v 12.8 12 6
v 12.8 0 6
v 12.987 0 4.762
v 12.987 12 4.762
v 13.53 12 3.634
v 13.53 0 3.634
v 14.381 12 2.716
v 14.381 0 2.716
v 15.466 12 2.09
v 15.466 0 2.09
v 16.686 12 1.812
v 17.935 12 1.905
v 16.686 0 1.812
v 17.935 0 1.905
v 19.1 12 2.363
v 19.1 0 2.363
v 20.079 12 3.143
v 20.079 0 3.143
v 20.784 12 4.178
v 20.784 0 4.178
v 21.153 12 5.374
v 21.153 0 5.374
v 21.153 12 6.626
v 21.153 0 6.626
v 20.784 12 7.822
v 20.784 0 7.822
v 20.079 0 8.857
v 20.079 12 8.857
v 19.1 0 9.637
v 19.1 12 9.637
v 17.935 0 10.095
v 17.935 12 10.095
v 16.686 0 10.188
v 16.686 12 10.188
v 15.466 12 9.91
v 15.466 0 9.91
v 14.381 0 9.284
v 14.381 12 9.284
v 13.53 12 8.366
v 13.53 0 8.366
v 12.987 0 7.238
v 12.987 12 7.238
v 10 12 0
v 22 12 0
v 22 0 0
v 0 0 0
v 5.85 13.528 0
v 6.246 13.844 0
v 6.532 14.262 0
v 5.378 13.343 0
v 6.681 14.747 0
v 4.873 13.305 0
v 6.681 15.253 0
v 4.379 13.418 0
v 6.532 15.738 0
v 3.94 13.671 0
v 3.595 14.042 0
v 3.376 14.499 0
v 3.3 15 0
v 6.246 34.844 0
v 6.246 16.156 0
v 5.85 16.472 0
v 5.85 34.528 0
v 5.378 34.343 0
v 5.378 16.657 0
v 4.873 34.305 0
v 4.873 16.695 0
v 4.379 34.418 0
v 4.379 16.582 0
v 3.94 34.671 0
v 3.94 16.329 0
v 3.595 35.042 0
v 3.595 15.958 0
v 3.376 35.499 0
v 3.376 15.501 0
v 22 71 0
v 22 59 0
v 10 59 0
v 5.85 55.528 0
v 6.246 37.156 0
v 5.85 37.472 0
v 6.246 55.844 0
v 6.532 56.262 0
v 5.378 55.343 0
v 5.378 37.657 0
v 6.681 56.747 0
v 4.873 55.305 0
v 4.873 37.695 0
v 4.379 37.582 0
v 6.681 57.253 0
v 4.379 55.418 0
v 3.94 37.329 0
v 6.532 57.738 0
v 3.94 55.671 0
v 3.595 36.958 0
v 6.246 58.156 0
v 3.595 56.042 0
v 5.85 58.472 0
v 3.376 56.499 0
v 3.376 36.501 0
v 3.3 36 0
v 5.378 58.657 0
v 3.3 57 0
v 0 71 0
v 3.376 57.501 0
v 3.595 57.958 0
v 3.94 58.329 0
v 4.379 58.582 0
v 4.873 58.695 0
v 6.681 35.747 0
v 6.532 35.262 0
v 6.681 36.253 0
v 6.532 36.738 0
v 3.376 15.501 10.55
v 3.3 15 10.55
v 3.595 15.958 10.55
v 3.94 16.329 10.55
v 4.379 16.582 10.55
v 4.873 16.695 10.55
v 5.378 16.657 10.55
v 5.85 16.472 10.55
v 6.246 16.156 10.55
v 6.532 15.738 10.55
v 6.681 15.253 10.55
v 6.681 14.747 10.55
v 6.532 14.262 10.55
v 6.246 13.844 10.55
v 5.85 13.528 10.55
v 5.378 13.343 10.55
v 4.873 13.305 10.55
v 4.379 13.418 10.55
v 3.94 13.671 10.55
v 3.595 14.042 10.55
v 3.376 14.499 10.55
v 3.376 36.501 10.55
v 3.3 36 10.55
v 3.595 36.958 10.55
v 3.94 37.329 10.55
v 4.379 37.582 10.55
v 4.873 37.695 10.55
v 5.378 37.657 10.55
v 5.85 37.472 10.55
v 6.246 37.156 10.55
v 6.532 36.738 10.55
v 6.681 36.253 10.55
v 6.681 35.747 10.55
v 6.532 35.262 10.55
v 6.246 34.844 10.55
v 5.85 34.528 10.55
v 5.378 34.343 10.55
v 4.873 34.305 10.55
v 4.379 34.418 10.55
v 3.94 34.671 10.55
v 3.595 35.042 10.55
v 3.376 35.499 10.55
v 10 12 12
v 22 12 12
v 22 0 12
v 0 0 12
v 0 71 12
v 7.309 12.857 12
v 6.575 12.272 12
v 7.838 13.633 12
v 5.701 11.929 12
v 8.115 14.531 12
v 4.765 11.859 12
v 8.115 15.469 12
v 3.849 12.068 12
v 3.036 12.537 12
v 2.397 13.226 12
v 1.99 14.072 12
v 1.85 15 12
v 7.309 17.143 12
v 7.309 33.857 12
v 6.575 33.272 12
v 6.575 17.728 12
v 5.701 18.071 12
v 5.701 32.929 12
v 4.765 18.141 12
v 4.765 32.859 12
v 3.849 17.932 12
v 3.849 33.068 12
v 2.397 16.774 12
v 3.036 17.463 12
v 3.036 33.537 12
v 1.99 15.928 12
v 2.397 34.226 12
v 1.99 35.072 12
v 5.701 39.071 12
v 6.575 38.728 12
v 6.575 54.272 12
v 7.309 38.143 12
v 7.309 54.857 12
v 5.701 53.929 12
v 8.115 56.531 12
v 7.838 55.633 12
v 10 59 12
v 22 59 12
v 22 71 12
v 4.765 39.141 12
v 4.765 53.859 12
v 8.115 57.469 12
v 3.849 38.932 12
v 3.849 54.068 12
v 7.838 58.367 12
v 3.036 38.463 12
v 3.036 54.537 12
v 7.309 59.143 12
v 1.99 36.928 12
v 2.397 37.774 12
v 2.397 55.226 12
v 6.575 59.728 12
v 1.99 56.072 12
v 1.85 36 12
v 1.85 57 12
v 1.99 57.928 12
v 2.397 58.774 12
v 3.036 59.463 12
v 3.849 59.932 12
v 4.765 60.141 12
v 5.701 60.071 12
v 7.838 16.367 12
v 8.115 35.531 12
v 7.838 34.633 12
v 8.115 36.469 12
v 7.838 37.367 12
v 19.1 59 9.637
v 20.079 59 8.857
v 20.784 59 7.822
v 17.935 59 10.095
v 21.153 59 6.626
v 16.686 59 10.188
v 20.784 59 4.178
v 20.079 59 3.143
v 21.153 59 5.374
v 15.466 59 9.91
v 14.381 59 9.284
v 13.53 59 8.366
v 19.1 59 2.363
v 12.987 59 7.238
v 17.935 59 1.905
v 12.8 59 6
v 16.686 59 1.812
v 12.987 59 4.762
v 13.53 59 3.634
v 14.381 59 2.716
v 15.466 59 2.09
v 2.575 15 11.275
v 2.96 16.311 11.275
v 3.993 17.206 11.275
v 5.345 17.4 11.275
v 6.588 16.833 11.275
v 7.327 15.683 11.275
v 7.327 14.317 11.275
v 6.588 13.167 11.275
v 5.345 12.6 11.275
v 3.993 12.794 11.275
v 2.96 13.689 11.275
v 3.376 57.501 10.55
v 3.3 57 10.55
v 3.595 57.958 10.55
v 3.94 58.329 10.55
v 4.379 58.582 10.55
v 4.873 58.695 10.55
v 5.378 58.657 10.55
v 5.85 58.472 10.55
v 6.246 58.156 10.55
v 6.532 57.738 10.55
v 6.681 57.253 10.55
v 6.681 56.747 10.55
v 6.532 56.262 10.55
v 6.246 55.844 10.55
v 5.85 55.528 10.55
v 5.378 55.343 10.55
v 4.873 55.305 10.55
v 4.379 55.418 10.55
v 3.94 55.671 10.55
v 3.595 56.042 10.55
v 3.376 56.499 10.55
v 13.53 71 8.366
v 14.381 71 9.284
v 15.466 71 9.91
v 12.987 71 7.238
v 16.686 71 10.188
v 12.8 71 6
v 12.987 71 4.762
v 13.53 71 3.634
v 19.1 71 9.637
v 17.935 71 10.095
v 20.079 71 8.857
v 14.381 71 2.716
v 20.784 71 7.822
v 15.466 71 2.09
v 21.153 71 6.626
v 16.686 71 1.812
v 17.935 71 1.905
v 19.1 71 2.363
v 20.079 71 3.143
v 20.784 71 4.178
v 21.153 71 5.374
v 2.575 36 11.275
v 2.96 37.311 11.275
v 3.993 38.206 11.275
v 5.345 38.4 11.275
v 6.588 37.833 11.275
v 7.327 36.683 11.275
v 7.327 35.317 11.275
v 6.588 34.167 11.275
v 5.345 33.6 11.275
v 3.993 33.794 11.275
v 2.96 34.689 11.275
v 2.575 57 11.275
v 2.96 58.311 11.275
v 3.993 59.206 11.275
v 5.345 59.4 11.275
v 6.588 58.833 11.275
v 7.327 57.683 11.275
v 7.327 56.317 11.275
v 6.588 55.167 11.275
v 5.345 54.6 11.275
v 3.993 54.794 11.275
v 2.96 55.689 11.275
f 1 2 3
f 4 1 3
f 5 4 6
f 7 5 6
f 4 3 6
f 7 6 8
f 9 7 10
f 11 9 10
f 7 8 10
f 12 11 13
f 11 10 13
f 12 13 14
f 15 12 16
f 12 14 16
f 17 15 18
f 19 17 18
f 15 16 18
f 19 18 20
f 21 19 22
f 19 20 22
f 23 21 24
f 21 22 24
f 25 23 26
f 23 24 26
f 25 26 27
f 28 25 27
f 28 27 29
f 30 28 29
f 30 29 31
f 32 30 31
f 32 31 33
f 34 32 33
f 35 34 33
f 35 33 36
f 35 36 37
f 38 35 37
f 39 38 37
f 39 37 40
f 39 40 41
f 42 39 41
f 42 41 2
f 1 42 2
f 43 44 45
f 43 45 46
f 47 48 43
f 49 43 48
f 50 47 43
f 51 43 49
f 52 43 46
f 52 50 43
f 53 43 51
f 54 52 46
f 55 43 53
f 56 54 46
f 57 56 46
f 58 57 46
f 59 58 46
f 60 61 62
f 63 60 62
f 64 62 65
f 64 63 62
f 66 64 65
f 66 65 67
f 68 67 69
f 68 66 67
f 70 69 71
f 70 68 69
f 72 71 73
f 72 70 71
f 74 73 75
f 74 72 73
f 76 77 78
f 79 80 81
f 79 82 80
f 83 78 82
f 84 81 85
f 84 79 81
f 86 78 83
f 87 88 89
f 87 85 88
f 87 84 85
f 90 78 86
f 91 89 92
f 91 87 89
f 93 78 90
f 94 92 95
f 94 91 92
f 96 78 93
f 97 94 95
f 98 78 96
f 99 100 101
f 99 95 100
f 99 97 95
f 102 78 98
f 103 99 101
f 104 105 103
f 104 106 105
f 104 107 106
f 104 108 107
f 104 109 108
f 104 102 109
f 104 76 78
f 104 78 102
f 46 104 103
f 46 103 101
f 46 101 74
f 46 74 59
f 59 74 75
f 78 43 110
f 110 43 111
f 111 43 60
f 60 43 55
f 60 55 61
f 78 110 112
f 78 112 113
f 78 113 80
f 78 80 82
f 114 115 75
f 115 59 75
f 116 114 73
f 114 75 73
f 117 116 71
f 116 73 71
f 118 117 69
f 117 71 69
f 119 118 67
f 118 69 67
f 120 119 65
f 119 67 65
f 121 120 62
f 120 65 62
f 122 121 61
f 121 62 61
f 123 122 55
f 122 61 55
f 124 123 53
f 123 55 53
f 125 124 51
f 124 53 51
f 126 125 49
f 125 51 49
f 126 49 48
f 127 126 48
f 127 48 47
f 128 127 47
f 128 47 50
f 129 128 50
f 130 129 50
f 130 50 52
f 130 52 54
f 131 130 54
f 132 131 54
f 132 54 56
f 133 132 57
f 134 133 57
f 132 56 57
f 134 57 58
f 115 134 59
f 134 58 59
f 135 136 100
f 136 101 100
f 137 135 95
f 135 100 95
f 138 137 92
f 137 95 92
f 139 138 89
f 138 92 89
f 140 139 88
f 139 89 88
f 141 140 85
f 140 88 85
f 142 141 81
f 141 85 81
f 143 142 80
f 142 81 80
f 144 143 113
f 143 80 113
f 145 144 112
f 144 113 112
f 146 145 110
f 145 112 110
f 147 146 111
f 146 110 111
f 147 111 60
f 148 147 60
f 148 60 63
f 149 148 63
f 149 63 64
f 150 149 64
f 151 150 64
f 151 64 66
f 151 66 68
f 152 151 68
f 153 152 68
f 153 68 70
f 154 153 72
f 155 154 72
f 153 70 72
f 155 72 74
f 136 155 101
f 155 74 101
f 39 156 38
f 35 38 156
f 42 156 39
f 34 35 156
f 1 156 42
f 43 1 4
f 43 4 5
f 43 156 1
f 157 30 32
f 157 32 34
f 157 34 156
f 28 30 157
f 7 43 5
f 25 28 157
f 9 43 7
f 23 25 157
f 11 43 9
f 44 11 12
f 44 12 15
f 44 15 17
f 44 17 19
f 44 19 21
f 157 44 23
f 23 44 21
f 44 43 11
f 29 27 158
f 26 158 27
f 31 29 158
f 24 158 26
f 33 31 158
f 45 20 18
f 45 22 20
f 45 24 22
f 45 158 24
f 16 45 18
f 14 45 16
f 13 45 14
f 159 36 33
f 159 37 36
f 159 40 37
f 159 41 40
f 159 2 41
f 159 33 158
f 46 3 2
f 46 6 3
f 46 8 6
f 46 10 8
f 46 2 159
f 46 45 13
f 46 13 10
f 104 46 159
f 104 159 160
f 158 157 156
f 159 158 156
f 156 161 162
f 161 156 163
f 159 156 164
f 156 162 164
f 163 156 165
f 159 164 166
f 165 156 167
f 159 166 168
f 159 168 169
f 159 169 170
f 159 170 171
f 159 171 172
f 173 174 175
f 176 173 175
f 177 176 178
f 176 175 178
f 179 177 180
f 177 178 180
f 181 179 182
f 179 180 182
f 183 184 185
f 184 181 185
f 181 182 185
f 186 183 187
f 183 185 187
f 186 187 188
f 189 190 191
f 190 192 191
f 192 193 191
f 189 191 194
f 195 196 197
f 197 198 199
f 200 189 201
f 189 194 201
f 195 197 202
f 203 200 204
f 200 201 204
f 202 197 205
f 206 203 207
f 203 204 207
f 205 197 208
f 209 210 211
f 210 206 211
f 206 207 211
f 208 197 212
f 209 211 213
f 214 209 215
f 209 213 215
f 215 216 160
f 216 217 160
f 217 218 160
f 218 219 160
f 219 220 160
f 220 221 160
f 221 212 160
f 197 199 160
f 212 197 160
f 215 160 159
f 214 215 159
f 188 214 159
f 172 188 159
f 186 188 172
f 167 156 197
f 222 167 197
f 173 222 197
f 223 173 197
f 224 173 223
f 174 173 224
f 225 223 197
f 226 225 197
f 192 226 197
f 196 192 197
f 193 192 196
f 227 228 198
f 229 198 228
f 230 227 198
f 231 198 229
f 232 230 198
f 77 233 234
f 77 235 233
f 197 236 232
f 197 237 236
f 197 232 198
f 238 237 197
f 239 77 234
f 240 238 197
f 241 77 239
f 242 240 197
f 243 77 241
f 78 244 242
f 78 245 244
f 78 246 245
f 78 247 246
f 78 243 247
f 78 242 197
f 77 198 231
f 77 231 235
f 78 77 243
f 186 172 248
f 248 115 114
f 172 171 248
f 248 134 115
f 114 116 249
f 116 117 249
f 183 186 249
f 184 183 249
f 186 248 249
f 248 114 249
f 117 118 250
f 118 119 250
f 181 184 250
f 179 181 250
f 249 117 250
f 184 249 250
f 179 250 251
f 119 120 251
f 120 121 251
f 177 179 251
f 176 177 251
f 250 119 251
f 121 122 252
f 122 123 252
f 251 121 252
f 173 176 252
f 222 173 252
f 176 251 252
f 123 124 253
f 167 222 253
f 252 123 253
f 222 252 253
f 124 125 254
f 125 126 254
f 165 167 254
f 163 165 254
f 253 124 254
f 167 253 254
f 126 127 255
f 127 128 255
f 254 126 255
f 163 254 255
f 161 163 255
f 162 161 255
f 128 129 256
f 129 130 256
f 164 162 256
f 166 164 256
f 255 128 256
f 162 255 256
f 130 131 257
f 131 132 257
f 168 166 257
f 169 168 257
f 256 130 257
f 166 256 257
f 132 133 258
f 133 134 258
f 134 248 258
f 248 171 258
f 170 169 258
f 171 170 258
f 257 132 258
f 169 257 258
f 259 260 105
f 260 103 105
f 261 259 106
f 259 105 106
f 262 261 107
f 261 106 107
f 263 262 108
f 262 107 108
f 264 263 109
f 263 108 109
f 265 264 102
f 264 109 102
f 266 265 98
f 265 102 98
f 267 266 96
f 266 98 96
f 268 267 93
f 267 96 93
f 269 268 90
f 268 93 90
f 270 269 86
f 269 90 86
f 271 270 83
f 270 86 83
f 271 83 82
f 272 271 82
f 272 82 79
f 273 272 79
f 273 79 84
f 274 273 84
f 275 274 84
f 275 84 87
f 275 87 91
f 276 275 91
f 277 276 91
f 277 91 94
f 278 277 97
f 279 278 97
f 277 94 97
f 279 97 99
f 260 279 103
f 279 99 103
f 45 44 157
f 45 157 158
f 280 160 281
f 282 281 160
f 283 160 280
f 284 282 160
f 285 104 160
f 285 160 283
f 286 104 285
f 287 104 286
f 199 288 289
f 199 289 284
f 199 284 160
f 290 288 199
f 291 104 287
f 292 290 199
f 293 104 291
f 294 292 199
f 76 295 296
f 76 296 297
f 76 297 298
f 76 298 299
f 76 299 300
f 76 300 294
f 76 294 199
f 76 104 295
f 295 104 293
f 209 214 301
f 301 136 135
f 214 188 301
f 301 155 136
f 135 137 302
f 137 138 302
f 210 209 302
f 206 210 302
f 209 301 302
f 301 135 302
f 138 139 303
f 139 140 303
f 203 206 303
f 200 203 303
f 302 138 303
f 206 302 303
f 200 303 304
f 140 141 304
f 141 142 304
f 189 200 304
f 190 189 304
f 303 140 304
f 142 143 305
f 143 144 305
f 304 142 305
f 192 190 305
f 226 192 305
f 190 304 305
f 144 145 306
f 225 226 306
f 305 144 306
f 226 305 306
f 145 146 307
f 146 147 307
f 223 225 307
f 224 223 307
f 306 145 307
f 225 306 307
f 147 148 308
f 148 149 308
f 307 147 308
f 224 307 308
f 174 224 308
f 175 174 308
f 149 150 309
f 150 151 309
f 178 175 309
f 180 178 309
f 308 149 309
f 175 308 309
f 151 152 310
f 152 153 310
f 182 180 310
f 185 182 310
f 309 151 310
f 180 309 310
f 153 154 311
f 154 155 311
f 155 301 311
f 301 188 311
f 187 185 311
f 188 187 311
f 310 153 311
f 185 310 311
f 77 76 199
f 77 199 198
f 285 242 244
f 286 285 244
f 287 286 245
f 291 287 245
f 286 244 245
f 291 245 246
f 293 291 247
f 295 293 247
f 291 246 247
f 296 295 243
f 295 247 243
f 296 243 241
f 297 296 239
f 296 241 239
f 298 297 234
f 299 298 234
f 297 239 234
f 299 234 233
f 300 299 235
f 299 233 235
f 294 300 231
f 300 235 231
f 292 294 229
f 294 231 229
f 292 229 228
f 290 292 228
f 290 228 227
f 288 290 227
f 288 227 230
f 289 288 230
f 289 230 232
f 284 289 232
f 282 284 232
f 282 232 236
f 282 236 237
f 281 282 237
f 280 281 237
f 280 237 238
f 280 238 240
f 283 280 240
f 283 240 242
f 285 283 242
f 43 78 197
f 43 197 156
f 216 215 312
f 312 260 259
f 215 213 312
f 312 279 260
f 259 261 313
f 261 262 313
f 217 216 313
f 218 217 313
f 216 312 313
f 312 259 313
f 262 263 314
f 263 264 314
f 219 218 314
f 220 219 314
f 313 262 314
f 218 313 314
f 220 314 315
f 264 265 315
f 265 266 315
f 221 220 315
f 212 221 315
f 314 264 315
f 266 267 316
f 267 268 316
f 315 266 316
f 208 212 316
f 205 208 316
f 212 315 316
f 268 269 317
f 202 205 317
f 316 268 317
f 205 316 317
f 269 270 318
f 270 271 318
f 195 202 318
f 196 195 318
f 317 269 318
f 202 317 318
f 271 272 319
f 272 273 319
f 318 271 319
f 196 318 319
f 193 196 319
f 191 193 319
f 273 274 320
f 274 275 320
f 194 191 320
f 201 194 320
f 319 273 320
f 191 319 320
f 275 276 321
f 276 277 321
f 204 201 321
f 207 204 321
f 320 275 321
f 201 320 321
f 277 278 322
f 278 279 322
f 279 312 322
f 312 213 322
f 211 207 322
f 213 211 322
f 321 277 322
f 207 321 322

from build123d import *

# Parameters (mm, degrees)
AUFSATZ_LINEAR_AUSTRAGEN1_DEPTH                      = 12
FORMSENKUNG_F_R_M3_LINSENSENKSCHRAUBE_MI_D           = 3.4
FORMSENKUNG_F_R_M3_LINSENSENKSCHRAUBE_MI_CSINK_D     = 6.3
FORMSENKUNG_F_R_M3_LINSENSENKSCHRAUBE_MI_CSINK_ANGLE = 90
F_8_4_8_4_DURCHMESSER_BOHRUNG3_D                     = 8.4


with BuildPart() as part:
    # Skizze1 → Aufsatz-Linear austragen1 (new body)
    with BuildSketch(Plane.XY):
        Polygon((0, 0), (0, 71), (22, 71), (22, 59), (10, 59), (10, 12), (22, 12), (22, 0), align=None)
    extrude(amount=AUFSATZ_LINEAR_AUSTRAGEN1_DEPTH)

    # Formsenkung für M3 Linsensenkschraube mit Schlitz2 (through all)
    with Locations(Plane.XY.offset(12)):
        with Locations((5, 57), (5, 36), (5, 15)):
            CounterSinkHole(FORMSENKUNG_F_R_M3_LINSENSENKSCHRAUBE_MI_D / 2, FORMSENKUNG_F_R_M3_LINSENSENKSCHRAUBE_MI_CSINK_D / 2, counter_sink_angle=FORMSENKUNG_F_R_M3_LINSENSENKSCHRAUBE_MI_CSINK_ANGLE)

    # Ø8.4 (8.4) Durchmesser Bohrung3 (through all)
    with Locations(Plane(origin=(0, 71, 0), x_dir=(1, 0, 0), z_dir=(0, 1, 0))):
        with Locations((17, -6)):
            Hole(F_8_4_8_4_DURCHMESSER_BOHRUNG3_D / 2)


solid = part.part
